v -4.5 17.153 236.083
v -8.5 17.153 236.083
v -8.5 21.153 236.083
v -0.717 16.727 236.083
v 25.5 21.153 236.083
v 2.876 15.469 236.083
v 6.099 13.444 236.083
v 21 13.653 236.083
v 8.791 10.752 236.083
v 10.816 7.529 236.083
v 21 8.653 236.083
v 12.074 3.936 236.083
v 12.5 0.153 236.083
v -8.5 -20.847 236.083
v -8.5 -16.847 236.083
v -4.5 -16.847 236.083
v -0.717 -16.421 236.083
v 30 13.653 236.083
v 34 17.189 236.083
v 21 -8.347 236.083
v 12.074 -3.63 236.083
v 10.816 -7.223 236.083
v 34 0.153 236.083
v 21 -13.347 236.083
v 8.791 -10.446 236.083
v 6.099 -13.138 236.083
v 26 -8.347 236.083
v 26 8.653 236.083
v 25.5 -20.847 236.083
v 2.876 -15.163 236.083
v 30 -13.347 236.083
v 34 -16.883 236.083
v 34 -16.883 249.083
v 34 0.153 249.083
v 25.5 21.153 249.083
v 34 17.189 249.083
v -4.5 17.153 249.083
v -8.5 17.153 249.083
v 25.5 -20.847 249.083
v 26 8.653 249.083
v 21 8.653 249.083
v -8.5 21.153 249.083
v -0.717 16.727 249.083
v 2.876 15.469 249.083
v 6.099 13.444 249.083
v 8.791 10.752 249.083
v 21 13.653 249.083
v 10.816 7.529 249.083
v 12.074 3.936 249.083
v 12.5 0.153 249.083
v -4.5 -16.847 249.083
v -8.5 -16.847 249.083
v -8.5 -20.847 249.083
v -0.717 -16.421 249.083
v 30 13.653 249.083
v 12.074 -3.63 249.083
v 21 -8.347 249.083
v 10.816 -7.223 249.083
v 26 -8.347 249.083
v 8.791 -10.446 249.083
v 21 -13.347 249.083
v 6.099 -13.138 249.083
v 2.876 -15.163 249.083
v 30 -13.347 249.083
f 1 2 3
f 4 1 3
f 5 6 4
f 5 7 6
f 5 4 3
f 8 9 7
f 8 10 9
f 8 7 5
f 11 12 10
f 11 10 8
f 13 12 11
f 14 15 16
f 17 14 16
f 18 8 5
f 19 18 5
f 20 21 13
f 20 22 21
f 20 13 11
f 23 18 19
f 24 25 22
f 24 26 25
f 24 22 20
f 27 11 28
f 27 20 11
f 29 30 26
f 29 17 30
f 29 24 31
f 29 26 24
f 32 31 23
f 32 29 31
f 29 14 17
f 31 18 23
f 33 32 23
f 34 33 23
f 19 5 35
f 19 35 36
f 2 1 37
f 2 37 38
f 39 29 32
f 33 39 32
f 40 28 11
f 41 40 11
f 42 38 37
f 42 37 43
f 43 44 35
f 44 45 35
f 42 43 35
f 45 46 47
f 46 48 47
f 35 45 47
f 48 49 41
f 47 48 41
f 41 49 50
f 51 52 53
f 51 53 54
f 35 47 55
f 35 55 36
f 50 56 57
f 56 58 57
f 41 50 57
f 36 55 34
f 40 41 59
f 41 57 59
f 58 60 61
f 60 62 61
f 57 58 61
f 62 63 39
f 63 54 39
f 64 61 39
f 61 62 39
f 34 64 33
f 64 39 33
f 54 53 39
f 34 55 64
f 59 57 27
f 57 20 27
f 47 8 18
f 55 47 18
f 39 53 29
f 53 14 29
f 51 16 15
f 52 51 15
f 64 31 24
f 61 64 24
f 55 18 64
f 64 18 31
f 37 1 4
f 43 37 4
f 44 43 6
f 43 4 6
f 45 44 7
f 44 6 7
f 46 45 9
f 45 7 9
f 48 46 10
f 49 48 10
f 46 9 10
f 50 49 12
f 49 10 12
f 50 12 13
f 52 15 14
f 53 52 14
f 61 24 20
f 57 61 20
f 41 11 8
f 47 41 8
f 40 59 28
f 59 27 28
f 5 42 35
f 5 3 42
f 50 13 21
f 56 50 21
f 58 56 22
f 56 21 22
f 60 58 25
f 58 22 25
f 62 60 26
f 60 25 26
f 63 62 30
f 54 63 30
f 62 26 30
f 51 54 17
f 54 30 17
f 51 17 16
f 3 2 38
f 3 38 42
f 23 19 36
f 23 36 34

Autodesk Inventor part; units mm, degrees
ref_plane "YZ Plane" through (0, 0, 0) normal (1, 0, 0) x (0, 1, 0)
ref_plane "XZ Plane" through (0, 0, 0) normal (0, 1, 0) x (-1, 0, 0)
ref_plane "XY Plane" through (0, 0, 0) normal (0, 0, 1) x (1, 0, 0)
ref_plane "Work Plane1" through (-4.5, 4.3393, 236.083) normal (0, 0, -1) x (1, 0, 0)
sketch "Sketch1" plane through (-4.5, 4.3393, 236.083) normal (0, 0, -1) x (1, 0, 0)
  circle A0 centre (0, 4.1863) radius 17 construction
  line L0 (34.5, -9.3137) -> (34.5, 17.6863) projected
  line L1 (34.5, 17.6863) -> (25.5, 17.6863) projected
  line L2 (25.5, 17.6863) -> (25.5, 12.6863) projected
  line L3 (25.5, 12.6863) -> (30.5, 12.6863) projected
  line L4 (30.5, 12.6863) -> (30.5, -4.3137) projected
  line L5 (30.5, -4.3137) -> (25.5, -4.3137) projected
  line L6 (25.5, -4.3137) -> (25.5, -9.3137) projected
  line L7 (25.5, -9.3137) -> (34.5, -9.3137) projected
  line L8 (0, -8.3452) -> (0, -17.0863) construction
  line L9 (0, -12.8137) -> (-4, -12.8137)
  line L10 (-4, -12.8137) -> (-4, -16.8137)
  line L11 (-4, -16.8137) -> (30, -16.8137)
  line L12 (30, -16.8137) -> (38.5, -12.8501)
  line L13 (38.5, -12.8501) -> (38.5, 4.1863)
  arc A1 (0, -12.8137) -> (17, 4.1863) centre (0, 4.1863) ccw
  line L14 (0, 4.1863) -> (38.5, 4.1863) construction
  line L15 (0, 21.1863) -> (-4, 21.1863)
  line L16 (-4, 21.1863) -> (-4, 25.1863)
  line L17 (-4, 25.1863) -> (30, 25.1863)
  line L18 (30, 25.1863) -> (38.5, 21.2227)
  line L19 (38.5, 21.2227) -> (38.5, 4.1863)
  arc A2 (17, 4.1863) -> (0, 21.1863) centre (0, 4.1863) ccw
  point P0 (4.5, 4.3393)
  point P1 (0, 25.4589)
  dimension "d0" = 4
  dimension "d1" = 4
  dimension "d2" = 4
  dimension "d3" = 115
  dimension "d4" = 8.5
extrude "Extrusion1" add sketch "Sketch1" against normal blind 13
properties part number "giunto_fondo_siringa"
